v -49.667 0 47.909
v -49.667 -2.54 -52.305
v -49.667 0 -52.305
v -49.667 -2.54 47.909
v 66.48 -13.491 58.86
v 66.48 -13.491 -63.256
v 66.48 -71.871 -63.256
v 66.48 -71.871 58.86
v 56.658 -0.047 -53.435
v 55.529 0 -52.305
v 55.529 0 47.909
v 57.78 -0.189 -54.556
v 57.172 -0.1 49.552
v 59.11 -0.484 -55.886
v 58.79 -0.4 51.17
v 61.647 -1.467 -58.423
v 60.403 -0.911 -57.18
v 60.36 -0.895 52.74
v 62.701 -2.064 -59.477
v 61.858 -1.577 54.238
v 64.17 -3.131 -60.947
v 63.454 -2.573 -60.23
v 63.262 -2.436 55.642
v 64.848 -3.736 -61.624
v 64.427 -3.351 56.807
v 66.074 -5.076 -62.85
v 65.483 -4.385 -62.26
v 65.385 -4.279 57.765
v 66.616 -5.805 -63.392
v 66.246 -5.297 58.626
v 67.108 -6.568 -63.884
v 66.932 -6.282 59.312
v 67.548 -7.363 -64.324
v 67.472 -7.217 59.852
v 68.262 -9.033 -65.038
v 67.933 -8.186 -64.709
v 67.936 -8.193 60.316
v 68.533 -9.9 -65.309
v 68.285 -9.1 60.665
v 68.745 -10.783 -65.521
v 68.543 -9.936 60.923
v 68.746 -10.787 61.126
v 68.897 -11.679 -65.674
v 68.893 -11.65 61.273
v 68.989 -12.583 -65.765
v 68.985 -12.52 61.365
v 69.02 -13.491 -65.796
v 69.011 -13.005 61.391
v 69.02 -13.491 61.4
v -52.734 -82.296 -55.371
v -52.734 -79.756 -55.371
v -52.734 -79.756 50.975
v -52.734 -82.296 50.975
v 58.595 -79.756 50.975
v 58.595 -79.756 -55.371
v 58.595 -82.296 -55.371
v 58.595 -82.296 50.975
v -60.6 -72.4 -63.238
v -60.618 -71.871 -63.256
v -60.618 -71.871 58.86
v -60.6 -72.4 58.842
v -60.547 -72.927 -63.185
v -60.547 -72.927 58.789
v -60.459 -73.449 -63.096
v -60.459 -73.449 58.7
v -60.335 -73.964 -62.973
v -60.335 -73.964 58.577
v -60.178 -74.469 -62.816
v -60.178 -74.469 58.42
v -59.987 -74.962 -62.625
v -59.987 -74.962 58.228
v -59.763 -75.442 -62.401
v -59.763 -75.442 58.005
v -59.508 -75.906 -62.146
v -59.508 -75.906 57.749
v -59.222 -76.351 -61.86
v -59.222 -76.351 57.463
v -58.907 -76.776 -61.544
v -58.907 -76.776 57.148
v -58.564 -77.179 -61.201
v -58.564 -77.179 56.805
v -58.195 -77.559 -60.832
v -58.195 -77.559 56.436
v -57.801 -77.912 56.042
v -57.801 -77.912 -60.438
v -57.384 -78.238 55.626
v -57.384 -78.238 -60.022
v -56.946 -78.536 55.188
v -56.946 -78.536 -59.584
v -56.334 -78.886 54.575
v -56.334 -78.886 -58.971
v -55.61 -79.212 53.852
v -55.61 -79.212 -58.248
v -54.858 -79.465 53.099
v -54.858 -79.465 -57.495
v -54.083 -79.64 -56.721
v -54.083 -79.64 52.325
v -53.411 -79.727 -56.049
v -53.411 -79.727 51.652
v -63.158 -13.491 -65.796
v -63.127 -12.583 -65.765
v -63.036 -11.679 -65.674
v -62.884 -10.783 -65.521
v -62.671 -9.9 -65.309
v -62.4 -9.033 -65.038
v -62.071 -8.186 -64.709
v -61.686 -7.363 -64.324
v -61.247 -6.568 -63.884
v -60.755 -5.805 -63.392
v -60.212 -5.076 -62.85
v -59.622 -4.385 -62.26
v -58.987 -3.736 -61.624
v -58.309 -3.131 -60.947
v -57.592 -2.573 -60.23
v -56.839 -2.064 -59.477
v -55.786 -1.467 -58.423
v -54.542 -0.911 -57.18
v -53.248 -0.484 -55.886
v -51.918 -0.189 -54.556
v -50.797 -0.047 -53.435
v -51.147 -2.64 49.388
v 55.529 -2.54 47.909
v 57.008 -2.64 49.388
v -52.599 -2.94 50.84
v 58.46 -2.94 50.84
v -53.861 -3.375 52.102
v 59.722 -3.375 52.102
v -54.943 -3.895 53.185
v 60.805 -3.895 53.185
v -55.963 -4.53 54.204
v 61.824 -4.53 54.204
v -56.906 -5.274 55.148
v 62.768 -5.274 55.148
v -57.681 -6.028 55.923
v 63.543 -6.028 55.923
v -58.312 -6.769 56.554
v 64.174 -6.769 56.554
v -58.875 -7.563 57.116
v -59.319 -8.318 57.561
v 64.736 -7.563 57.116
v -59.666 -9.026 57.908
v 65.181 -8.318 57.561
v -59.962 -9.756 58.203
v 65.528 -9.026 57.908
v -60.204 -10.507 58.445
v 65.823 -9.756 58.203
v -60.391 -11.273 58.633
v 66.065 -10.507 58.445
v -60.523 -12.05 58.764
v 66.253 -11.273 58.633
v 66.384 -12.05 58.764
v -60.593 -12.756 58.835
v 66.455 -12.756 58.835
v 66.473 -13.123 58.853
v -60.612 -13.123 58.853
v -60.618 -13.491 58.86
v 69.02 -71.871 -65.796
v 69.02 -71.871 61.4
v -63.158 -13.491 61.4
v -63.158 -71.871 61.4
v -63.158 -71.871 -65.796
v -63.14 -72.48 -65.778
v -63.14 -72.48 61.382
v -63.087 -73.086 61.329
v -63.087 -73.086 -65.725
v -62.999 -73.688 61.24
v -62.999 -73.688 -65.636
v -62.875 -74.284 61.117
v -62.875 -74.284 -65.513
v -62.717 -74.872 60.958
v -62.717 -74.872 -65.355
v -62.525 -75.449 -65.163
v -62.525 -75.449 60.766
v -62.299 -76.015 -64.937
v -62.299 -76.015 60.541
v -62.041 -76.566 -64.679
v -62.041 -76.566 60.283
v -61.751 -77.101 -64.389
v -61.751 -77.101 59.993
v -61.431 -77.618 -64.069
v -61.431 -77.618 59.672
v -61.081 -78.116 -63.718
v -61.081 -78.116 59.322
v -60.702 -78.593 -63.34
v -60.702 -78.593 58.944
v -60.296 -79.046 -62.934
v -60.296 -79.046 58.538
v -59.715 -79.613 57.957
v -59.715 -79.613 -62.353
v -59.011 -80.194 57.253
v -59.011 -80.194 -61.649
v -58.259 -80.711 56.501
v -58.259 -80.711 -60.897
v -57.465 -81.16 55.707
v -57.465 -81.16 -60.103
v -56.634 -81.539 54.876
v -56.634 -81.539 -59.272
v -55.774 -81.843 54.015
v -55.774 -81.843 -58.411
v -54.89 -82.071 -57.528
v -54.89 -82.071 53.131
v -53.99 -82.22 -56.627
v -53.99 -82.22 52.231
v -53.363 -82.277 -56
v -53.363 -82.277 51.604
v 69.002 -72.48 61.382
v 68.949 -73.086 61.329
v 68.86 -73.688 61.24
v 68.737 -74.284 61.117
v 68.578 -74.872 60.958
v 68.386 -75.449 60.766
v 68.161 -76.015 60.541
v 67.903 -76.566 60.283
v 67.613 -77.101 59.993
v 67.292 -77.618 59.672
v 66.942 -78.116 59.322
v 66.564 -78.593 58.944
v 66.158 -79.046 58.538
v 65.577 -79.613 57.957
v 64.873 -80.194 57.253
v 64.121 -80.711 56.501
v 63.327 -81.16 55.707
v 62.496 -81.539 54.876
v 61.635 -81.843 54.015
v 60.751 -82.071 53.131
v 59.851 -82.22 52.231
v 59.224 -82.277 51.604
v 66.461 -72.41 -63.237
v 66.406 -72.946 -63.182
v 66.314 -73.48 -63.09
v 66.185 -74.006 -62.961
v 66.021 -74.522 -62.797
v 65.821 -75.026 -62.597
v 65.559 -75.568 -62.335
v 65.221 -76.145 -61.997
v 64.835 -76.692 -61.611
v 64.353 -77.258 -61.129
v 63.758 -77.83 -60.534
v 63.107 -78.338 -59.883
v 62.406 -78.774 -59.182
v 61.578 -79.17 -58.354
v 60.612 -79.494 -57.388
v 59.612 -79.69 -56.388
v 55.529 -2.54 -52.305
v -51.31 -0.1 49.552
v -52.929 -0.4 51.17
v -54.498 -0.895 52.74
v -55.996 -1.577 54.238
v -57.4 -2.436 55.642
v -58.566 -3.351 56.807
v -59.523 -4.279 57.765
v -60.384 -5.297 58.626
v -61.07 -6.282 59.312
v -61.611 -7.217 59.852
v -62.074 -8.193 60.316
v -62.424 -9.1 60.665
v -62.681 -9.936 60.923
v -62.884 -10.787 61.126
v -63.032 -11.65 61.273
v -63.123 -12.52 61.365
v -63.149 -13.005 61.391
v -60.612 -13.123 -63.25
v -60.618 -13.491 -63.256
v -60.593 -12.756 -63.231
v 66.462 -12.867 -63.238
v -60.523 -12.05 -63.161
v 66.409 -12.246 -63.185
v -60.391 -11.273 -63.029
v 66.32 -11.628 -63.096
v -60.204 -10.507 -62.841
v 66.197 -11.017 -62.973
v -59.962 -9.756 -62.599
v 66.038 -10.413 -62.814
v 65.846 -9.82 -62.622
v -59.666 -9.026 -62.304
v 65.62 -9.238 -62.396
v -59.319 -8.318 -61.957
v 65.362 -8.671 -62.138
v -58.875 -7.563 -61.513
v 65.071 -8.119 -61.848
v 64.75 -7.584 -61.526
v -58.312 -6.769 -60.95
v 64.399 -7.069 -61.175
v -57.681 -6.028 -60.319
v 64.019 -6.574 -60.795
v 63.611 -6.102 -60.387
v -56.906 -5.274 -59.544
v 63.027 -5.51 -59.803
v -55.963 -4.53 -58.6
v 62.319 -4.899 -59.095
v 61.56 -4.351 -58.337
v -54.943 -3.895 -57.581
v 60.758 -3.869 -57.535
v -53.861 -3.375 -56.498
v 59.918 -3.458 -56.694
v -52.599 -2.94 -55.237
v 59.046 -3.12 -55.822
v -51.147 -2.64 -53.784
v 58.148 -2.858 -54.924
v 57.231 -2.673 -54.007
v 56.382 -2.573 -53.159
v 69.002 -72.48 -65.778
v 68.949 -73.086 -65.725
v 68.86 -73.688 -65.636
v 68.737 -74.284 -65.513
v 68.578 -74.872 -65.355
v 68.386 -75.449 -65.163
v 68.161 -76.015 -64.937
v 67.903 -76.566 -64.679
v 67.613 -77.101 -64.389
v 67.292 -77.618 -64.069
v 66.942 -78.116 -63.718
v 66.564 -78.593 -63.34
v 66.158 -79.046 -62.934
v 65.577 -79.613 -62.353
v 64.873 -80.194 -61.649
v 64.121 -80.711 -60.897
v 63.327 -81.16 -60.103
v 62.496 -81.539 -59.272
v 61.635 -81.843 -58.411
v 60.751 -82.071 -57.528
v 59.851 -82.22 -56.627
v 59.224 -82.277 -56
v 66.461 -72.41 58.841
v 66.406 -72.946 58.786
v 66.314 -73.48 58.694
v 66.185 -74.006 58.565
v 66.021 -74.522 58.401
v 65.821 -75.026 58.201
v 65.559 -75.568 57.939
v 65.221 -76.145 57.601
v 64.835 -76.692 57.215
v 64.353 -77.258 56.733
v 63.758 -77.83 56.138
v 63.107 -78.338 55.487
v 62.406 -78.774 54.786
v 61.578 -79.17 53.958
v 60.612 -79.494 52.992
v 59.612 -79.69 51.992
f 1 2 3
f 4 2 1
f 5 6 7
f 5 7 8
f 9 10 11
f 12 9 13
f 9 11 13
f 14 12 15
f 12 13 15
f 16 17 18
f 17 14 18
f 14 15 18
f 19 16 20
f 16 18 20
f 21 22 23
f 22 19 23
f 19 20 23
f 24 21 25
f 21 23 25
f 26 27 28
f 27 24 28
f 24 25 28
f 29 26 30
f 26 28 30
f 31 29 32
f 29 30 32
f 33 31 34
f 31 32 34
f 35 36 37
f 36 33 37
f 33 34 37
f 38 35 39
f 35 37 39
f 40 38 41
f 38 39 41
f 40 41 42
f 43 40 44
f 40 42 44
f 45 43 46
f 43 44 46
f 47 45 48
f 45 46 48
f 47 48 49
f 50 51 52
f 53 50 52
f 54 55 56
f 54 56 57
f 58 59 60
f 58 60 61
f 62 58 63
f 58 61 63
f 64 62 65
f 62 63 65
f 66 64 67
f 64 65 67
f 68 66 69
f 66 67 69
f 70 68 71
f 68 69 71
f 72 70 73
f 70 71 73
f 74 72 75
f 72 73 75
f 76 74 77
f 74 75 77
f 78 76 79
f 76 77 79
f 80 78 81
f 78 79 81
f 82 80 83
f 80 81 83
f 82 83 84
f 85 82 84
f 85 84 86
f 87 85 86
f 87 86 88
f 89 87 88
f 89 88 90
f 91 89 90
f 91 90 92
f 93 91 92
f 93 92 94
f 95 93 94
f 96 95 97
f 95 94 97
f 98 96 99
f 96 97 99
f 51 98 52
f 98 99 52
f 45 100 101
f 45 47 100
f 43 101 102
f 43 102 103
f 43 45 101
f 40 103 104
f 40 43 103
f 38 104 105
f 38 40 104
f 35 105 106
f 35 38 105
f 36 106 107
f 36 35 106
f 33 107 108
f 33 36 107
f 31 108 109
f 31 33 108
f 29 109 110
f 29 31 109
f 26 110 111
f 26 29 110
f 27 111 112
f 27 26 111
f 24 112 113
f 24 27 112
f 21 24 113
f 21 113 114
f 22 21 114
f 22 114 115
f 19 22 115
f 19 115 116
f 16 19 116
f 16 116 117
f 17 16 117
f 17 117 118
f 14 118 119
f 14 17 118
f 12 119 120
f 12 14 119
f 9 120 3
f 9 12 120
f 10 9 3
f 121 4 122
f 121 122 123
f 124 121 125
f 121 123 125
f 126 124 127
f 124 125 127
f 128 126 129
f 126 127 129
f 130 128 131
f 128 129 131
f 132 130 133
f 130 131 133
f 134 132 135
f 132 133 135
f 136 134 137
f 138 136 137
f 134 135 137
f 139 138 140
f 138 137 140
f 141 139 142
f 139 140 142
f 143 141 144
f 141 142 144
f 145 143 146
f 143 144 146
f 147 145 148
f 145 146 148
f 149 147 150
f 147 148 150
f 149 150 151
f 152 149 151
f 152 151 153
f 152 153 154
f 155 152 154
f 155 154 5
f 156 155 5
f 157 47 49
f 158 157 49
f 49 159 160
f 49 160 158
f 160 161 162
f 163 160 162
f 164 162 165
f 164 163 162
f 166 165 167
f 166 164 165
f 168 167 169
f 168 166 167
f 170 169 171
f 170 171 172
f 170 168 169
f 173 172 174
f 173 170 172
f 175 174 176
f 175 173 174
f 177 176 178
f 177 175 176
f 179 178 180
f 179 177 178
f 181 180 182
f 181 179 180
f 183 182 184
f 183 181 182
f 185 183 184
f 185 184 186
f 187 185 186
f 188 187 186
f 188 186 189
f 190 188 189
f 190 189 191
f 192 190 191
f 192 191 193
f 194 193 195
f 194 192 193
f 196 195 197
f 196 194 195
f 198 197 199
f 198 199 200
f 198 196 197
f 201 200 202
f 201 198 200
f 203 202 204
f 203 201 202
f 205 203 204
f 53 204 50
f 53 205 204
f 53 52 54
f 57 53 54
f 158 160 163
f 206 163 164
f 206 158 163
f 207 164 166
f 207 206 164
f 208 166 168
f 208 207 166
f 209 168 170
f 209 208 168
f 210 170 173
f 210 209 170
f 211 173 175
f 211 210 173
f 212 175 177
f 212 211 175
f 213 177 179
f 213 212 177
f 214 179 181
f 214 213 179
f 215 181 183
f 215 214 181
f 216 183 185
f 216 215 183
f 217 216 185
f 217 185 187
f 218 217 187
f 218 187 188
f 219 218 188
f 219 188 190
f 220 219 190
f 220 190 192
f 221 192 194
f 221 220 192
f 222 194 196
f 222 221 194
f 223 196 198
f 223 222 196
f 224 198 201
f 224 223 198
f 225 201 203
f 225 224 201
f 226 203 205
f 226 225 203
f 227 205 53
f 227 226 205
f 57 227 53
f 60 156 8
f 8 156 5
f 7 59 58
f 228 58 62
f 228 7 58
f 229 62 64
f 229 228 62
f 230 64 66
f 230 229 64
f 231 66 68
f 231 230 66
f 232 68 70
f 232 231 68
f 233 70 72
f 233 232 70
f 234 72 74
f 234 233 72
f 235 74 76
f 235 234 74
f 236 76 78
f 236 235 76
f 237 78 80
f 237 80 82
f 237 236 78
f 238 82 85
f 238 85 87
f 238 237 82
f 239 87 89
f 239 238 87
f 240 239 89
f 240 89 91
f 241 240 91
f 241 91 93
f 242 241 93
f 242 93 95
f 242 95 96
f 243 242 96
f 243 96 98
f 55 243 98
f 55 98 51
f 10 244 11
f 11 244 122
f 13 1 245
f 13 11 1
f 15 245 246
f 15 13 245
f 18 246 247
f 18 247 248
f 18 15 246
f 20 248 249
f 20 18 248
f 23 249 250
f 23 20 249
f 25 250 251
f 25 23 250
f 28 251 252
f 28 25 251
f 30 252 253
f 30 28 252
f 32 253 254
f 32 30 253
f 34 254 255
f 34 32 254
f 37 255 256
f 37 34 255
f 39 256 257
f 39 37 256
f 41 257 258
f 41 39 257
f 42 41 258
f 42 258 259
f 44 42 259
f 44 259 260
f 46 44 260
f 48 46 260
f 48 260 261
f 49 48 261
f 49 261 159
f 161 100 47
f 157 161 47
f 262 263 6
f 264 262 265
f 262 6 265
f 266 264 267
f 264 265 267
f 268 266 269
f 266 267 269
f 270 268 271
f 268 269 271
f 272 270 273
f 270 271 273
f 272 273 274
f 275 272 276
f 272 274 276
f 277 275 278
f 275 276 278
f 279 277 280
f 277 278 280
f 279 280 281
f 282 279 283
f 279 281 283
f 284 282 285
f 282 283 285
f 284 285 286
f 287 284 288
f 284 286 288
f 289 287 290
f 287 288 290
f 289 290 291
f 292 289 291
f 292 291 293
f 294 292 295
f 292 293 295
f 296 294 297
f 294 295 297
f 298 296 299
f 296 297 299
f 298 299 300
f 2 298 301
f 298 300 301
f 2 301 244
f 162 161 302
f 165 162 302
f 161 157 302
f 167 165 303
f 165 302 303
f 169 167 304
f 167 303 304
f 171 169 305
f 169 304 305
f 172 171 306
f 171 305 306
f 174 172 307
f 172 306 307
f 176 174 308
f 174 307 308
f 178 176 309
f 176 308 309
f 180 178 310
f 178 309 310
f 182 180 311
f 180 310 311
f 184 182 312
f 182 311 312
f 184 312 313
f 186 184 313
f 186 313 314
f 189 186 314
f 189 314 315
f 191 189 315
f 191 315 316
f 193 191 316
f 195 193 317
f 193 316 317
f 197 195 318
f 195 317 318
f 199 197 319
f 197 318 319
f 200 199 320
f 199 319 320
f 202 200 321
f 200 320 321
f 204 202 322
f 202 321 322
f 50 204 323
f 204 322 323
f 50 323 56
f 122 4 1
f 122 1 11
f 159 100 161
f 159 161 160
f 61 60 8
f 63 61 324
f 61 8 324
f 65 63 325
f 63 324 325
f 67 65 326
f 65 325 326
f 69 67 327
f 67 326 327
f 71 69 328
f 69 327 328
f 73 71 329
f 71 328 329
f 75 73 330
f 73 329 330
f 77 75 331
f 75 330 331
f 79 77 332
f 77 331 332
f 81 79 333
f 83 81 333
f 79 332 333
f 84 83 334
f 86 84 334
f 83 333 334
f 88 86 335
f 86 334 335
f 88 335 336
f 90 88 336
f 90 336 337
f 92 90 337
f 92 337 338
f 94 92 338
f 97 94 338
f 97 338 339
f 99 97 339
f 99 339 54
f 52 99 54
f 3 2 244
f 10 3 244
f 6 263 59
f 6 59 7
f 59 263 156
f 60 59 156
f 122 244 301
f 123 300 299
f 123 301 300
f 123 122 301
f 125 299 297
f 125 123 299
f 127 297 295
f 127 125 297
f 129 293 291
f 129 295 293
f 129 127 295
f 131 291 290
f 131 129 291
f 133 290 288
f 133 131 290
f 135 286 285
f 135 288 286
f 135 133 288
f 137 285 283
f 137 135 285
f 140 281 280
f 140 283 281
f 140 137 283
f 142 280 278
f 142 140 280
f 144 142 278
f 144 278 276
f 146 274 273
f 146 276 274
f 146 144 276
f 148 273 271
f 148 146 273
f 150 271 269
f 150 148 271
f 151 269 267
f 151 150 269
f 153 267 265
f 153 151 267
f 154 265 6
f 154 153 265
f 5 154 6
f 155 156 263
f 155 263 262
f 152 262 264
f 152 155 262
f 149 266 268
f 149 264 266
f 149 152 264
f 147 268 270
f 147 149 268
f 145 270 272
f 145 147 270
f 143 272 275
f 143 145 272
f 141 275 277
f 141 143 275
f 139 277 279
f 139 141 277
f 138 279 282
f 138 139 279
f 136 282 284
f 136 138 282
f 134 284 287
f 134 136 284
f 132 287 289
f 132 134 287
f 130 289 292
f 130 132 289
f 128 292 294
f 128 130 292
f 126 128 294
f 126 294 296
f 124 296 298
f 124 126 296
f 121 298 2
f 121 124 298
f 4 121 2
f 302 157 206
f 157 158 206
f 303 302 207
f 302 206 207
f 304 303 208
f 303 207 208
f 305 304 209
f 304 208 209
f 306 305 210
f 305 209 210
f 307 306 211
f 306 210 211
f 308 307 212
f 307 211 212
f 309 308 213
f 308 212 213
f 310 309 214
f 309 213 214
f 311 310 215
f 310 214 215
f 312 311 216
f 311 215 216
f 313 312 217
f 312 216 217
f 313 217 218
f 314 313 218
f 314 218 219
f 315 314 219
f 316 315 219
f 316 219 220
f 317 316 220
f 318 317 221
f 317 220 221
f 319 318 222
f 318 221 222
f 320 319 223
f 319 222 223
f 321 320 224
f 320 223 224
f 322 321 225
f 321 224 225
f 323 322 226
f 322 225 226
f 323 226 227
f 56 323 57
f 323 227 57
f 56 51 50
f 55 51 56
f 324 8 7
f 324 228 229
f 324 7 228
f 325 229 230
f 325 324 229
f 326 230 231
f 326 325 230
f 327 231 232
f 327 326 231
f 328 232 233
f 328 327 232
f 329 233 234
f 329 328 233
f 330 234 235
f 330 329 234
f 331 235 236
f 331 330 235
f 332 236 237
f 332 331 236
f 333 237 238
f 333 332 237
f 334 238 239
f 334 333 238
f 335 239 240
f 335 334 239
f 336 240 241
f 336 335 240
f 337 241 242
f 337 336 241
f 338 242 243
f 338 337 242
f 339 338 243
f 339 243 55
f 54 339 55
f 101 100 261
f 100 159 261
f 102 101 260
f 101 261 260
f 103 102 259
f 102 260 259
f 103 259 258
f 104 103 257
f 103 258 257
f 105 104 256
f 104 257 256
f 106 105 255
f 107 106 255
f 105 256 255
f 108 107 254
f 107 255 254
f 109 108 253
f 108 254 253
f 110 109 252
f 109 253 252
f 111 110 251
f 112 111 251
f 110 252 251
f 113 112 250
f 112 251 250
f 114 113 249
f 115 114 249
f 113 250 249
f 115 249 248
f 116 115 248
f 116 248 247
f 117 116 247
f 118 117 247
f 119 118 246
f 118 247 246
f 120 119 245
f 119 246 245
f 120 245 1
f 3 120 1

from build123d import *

# Parameters (mm, degrees)
F0_W     = 132.177695632
F0_H     = 127.1953880787
F1_DEPTH = 82.296
F2_R     = 10.4245741623
F3_R     = 13.4906253865
F4_T     = -2.54


# Not quite as in the source:
# - a shell that OpenCascade refuses in one call is made with other operations: the cavity is built on its own and cut out


with BuildPart() as f1:
    # F0 (on Front) → F1 (new body)
    with BuildSketch(Plane.XZ):
        with Locations((2.9307678342, -2.1980777383)):
            Rectangle(F0_W, F0_H)
    extrude(amount=F1_DEPTH)

    # F2
    f2_edges = [f1.edges().sort_by_distance(p)[0] for p in [
        (2.930768, -82.296, 61.399616),
        (-63.15808, -82.296, -2.198078),
        (2.930768, -82.296, -65.795772),
        (69.019616, -82.296, -2.198078),
    ]]
    fillet(f2_edges, radius=F2_R)

    # F3
    f3_edges = [f1.edges().sort_by_distance(p)[0] for p in [
        (2.930768, 0, 61.399616),
        (-63.15808, 0, -2.198078),
        (2.930768, 0, -65.795772),
        (69.019616, 0, -2.198078),
    ]]
    fillet(f3_edges, radius=F3_R)

    # F4: a shell. OpenCascade refuses it in one call, so the cavity is built on its own and cut out:
    # the body offset inwards by the wall thickness, plus a prism from it out through each open face.
    f4_core = offset(f1.part, amount=F4_T, mode=Mode.PRIVATE)
    f4_exits = [f4_core.faces().sort_by_distance(p)[0] for p in [
        (2.930768, -79.756, -2.198078),
        (2.930768, -2.54, -2.198078),
    ]]
    add(f4_core, mode=Mode.SUBTRACT)
    extrude(f4_exits, amount=-F4_T, mode=Mode.SUBTRACT)


solid = f1.part
